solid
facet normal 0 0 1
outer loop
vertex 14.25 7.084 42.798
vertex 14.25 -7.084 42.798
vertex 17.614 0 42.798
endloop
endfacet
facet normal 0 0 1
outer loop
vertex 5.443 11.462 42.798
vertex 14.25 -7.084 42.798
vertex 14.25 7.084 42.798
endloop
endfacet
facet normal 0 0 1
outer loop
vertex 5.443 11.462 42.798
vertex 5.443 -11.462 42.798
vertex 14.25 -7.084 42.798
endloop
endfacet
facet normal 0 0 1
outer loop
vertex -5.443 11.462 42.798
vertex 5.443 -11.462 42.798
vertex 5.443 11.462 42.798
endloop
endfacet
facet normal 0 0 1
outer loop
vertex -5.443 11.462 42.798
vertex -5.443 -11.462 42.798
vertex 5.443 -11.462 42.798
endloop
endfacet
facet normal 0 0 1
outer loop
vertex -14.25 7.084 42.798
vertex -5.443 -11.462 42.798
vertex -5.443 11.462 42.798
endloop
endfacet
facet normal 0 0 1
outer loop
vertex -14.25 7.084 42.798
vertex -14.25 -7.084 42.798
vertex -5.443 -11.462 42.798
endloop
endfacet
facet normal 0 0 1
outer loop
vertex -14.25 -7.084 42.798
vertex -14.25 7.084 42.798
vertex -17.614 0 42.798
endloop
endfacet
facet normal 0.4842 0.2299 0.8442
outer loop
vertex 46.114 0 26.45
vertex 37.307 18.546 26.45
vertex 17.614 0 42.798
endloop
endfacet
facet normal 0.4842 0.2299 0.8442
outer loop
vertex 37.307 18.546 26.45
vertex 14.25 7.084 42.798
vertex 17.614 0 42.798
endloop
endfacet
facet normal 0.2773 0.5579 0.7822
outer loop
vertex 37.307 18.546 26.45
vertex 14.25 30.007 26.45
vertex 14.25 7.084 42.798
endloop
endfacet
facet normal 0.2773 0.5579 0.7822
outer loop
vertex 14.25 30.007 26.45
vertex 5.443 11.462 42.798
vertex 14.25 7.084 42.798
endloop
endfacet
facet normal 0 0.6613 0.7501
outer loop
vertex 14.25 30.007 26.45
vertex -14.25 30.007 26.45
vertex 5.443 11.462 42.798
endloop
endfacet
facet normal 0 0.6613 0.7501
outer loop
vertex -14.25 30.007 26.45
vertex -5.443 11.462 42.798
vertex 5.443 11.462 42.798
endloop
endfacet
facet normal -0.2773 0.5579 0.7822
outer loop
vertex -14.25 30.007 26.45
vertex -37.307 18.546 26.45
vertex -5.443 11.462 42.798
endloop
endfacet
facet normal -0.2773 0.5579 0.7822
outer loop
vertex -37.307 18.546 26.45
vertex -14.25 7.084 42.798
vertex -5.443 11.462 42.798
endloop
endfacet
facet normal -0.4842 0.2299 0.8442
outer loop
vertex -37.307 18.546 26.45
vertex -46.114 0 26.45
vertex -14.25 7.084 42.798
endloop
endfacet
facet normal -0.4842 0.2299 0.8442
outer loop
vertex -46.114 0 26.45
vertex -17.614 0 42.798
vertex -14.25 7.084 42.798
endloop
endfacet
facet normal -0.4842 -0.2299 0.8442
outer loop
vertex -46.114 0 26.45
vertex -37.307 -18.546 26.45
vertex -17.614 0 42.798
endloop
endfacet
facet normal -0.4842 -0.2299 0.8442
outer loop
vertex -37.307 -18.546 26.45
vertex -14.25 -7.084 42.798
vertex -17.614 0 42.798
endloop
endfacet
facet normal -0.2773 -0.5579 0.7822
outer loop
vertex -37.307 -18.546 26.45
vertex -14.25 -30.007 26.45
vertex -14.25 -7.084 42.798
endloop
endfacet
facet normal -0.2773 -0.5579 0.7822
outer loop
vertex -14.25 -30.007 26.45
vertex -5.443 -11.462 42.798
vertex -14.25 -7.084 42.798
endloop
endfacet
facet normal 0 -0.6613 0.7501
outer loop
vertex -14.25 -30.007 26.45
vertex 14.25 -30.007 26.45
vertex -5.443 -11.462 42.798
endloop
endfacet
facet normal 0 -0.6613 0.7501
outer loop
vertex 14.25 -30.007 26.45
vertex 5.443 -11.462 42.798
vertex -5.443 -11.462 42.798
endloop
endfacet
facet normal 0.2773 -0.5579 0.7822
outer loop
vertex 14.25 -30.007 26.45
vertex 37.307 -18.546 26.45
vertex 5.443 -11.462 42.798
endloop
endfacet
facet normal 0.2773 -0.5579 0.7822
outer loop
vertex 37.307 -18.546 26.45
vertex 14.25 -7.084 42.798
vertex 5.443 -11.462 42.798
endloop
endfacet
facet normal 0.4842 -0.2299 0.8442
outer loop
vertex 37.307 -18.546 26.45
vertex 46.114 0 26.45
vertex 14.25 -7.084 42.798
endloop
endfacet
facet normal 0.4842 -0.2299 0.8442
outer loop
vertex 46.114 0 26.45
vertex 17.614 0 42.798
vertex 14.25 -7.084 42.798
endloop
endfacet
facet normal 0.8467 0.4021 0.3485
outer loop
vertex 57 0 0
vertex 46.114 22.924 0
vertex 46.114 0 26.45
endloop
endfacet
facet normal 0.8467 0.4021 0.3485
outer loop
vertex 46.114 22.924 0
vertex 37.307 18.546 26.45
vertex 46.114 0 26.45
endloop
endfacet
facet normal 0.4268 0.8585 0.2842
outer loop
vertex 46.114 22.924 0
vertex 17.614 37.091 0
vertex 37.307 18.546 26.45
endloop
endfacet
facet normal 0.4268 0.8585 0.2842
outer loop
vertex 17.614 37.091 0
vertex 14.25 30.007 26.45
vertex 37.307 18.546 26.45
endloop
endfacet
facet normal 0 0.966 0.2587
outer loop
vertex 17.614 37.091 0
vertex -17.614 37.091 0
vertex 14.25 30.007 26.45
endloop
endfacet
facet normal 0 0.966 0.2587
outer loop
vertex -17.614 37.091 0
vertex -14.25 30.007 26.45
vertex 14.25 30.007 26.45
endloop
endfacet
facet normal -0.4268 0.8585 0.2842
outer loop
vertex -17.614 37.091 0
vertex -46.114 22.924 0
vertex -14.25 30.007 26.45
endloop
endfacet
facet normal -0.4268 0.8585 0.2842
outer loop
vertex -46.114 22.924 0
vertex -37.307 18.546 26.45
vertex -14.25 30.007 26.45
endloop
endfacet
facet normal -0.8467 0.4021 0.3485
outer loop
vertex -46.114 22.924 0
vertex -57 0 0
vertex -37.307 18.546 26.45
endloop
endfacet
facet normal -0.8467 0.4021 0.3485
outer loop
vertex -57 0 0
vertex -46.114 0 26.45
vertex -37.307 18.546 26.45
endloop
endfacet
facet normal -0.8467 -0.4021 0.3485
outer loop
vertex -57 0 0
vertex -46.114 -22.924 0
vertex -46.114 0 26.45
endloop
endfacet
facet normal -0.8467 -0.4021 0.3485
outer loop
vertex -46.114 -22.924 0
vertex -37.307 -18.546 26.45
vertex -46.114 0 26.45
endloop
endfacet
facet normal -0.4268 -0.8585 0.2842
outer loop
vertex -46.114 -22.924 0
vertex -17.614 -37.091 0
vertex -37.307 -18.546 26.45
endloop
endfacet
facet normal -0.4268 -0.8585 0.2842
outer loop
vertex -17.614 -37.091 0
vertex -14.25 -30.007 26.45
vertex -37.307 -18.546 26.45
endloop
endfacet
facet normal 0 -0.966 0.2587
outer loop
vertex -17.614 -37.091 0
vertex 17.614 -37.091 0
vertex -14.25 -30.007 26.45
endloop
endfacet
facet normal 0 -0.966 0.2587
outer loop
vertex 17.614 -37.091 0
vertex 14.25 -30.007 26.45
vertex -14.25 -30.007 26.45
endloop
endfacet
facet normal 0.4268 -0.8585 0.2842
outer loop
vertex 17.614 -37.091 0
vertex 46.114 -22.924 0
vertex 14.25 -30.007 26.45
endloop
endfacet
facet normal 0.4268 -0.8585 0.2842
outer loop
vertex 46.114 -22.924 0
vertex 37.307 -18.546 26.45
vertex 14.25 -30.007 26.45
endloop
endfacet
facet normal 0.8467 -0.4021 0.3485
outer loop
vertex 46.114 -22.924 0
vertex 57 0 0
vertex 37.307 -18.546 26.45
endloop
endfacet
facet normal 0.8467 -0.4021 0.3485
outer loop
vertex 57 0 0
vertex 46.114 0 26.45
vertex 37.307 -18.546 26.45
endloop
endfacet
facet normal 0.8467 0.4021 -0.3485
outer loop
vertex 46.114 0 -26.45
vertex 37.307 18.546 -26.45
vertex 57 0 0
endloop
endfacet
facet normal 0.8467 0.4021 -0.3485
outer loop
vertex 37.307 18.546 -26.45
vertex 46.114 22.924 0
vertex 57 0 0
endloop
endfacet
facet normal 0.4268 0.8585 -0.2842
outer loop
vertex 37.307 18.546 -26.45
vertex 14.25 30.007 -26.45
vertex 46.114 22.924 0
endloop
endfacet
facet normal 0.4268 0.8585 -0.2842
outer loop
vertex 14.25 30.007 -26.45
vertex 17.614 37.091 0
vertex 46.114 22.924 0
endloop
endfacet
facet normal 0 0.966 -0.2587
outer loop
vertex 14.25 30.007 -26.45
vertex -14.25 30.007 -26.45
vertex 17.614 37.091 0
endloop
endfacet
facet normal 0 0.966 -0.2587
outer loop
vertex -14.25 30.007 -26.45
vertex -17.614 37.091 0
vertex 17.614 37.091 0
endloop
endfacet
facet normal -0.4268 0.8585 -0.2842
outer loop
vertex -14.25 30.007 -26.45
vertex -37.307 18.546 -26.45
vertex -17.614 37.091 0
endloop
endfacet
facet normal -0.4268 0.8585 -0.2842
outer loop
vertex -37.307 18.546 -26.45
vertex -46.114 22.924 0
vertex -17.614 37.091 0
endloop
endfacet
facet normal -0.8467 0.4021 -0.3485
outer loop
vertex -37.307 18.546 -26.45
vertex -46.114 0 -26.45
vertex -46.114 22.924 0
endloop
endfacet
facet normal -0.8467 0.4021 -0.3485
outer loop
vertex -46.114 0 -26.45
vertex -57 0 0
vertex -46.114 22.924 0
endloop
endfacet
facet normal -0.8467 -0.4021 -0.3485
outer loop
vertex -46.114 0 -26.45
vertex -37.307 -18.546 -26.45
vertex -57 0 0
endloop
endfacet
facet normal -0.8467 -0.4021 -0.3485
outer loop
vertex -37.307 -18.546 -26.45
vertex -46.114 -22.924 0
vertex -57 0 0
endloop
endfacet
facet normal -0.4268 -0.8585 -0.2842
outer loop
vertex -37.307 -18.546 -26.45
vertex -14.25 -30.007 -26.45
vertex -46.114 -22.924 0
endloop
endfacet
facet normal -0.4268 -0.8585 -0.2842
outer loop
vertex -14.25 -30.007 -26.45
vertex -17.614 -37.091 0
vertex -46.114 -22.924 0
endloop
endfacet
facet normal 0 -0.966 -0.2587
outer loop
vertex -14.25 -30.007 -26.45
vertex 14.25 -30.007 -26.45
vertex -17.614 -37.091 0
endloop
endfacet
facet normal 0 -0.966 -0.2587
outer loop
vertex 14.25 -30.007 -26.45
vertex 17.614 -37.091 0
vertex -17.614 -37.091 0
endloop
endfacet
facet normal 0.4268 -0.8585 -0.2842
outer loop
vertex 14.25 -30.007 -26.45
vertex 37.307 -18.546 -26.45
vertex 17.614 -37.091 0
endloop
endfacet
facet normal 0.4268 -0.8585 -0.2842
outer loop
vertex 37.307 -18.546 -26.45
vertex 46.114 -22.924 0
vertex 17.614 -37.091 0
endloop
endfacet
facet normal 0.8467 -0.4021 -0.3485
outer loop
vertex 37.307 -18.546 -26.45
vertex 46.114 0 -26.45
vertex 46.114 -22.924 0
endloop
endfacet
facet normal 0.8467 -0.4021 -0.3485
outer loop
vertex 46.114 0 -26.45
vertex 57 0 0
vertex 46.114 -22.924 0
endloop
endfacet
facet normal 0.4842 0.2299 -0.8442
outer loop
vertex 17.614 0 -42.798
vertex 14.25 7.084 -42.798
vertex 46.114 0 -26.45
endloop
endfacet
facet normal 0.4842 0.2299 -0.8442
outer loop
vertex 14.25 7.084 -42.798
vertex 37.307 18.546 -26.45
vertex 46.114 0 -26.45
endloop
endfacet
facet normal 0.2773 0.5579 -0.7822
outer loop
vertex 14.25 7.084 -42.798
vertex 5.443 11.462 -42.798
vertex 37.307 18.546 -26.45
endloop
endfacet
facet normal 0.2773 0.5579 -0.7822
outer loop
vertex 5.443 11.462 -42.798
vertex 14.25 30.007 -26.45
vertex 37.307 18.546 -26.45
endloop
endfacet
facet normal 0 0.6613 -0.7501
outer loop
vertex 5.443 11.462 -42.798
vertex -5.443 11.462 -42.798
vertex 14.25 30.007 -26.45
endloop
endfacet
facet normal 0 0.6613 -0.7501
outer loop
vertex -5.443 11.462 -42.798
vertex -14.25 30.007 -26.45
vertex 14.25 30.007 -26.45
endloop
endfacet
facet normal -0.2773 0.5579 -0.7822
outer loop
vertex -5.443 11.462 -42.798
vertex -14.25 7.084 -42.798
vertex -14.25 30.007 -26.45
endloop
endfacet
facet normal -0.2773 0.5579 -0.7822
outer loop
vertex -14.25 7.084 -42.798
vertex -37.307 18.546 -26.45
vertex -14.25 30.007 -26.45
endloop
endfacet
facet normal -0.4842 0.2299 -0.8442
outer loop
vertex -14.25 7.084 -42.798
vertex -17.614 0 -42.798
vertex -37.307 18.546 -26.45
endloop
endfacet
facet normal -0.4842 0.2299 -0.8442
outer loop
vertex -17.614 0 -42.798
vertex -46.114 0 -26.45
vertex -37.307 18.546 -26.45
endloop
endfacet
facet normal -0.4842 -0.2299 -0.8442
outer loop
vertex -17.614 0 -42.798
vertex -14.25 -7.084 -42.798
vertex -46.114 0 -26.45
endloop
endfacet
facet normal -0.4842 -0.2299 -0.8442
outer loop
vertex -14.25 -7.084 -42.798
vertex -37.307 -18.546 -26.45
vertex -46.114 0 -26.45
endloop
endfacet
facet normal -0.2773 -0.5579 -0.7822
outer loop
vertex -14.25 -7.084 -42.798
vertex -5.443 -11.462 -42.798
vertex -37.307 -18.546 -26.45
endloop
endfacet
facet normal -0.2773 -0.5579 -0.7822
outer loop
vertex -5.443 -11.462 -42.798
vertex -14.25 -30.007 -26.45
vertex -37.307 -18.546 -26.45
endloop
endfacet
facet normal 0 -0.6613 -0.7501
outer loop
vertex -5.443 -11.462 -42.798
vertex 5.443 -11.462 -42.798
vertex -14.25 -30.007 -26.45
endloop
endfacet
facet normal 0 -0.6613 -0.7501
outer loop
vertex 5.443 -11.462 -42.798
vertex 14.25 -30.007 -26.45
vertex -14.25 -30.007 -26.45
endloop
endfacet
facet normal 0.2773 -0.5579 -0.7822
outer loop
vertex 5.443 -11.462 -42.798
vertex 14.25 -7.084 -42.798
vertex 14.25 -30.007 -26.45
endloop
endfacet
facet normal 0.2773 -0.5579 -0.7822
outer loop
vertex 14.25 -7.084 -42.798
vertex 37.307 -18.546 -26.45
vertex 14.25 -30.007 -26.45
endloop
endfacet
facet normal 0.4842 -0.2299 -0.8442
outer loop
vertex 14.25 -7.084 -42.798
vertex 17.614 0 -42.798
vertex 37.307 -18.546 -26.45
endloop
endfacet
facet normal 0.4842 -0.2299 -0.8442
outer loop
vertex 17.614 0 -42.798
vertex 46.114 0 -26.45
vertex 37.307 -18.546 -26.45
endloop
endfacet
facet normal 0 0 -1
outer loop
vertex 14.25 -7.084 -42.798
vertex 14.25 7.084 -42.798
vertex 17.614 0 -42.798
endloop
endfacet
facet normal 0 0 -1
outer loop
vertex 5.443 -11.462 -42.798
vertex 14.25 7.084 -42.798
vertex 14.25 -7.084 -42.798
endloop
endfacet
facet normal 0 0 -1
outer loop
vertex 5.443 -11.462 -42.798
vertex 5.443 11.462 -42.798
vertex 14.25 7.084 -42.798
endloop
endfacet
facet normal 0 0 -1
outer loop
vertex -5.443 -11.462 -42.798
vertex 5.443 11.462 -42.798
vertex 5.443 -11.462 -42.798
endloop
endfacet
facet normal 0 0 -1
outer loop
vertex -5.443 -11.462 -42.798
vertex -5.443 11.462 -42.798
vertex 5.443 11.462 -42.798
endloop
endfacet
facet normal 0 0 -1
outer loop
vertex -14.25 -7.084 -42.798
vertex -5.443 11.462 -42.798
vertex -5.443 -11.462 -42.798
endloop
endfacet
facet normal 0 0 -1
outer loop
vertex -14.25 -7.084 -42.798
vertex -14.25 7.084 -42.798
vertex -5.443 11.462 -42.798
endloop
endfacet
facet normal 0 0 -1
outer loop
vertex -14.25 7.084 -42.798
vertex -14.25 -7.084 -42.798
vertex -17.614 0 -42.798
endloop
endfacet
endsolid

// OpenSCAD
// Generated by SolidPython 1.0.1 on 2020-07-29 00:46:54


scale(v = [19, 13, 15]) {
	sphere(r = 3);
}
/***********************************************
*********      SolidPython code:      **********
************************************************
 
# import packages: SolidPython
from solid import *
from solid.utils import *
from itertools import chain, combinations, permutations


class Resize:

    def __init__(self, scad_file):
        self.scad_file = scad_file
        #self.scad_file = import_scad(scad_file)
        # cone/cylinder param:
        self.r1 = 0
        self.r2 = 0
        self.h = 0
        # rectangular prism param:
        self.w = 0
        self.l = 0
        # ellipse param:
        self.r = 0

    # import OpenScad code (file name corresponds to shape)


    # classify shape + parameters
    def assign(self, param1, param2, param3):
        if self.scad_file == 'cone.scad':
            self.r1 = param1
            self.r2 = param2
            self.h = param3
        elif self.scad_file == 'cylinder.scad':
            self.r1 = param1
            self.r2 = param2
            self.h = param3
        elif self.scad_file == 'rectangularPrism.scad':
            self.h = param1
            self.l = param2
            self.w = param3
        else:
            self.r = param1
            self.h = param2

    # resize parameters
    def iterate(self):
        x = range(3, 20, 2)
        i = 1
        if self.scad_file == 'cone.scad':
            tempList = list(permutations(x, 2))
            for temp in tempList:
                param1 = temp[0]
                param2 = temp[1]
                filepath = 'produced_scad_files/' + 'cone' + str(param1) + '_' + str(param2) + '_' + '.scad'
                scad_render_to_file(cylinder(h=param1, r1=param2, r2=0), filepath)

        elif self.scad_file == 'cylinder.scad':
            tempList = list(permutations(x, 3))
            for temp in tempList:
                param1 = temp[0]
                param2 = temp[1]
                filepath = 'produced_scad_files/' + 'cylinder' + str(param1) + '_' + str(param2) + '_' + '.scad'
                scad_render_to_file(cylinder(h=param1, r1=param2, r2=param2), filepath)

        elif self.scad_file == 'rectangularPrism.scad':
            tempList = list(permutations(x, 3))
            for temp in tempList:
                param1 = temp[0]
                param2 = temp[1]
                param3 = temp[2]
                filepath = 'produced_scad_files/' + 'rectangularPrism' + str(param1) + '_' + str(param2) + '_' + str(
                    param3) + '.scad'
                scad_render_to_file(cube(size=(param1, param2, param3)), filepath)

        elif self.scad_file == 'ellipse.scad':
            tempList = list(permutations(x, 4))
            for temp in tempList:
                param1 = temp[0]
                param2 = temp[1]
                param3 = temp[2]
                param4 = temp[3]
                filepath = 'produced_scad_files/' + 'ellipse' + str(param1) + '_' + str(param2) + '_' + str(param3) + '_' + str(param4) + '.scad'
                scad_render_to_file(scale([param1, param2, param3])(sphere(r=param4)), filepath)

    def render_to_scadfile(self):
        scad_render_to_file(scad, 'example.scad') 
 
************************************************/
